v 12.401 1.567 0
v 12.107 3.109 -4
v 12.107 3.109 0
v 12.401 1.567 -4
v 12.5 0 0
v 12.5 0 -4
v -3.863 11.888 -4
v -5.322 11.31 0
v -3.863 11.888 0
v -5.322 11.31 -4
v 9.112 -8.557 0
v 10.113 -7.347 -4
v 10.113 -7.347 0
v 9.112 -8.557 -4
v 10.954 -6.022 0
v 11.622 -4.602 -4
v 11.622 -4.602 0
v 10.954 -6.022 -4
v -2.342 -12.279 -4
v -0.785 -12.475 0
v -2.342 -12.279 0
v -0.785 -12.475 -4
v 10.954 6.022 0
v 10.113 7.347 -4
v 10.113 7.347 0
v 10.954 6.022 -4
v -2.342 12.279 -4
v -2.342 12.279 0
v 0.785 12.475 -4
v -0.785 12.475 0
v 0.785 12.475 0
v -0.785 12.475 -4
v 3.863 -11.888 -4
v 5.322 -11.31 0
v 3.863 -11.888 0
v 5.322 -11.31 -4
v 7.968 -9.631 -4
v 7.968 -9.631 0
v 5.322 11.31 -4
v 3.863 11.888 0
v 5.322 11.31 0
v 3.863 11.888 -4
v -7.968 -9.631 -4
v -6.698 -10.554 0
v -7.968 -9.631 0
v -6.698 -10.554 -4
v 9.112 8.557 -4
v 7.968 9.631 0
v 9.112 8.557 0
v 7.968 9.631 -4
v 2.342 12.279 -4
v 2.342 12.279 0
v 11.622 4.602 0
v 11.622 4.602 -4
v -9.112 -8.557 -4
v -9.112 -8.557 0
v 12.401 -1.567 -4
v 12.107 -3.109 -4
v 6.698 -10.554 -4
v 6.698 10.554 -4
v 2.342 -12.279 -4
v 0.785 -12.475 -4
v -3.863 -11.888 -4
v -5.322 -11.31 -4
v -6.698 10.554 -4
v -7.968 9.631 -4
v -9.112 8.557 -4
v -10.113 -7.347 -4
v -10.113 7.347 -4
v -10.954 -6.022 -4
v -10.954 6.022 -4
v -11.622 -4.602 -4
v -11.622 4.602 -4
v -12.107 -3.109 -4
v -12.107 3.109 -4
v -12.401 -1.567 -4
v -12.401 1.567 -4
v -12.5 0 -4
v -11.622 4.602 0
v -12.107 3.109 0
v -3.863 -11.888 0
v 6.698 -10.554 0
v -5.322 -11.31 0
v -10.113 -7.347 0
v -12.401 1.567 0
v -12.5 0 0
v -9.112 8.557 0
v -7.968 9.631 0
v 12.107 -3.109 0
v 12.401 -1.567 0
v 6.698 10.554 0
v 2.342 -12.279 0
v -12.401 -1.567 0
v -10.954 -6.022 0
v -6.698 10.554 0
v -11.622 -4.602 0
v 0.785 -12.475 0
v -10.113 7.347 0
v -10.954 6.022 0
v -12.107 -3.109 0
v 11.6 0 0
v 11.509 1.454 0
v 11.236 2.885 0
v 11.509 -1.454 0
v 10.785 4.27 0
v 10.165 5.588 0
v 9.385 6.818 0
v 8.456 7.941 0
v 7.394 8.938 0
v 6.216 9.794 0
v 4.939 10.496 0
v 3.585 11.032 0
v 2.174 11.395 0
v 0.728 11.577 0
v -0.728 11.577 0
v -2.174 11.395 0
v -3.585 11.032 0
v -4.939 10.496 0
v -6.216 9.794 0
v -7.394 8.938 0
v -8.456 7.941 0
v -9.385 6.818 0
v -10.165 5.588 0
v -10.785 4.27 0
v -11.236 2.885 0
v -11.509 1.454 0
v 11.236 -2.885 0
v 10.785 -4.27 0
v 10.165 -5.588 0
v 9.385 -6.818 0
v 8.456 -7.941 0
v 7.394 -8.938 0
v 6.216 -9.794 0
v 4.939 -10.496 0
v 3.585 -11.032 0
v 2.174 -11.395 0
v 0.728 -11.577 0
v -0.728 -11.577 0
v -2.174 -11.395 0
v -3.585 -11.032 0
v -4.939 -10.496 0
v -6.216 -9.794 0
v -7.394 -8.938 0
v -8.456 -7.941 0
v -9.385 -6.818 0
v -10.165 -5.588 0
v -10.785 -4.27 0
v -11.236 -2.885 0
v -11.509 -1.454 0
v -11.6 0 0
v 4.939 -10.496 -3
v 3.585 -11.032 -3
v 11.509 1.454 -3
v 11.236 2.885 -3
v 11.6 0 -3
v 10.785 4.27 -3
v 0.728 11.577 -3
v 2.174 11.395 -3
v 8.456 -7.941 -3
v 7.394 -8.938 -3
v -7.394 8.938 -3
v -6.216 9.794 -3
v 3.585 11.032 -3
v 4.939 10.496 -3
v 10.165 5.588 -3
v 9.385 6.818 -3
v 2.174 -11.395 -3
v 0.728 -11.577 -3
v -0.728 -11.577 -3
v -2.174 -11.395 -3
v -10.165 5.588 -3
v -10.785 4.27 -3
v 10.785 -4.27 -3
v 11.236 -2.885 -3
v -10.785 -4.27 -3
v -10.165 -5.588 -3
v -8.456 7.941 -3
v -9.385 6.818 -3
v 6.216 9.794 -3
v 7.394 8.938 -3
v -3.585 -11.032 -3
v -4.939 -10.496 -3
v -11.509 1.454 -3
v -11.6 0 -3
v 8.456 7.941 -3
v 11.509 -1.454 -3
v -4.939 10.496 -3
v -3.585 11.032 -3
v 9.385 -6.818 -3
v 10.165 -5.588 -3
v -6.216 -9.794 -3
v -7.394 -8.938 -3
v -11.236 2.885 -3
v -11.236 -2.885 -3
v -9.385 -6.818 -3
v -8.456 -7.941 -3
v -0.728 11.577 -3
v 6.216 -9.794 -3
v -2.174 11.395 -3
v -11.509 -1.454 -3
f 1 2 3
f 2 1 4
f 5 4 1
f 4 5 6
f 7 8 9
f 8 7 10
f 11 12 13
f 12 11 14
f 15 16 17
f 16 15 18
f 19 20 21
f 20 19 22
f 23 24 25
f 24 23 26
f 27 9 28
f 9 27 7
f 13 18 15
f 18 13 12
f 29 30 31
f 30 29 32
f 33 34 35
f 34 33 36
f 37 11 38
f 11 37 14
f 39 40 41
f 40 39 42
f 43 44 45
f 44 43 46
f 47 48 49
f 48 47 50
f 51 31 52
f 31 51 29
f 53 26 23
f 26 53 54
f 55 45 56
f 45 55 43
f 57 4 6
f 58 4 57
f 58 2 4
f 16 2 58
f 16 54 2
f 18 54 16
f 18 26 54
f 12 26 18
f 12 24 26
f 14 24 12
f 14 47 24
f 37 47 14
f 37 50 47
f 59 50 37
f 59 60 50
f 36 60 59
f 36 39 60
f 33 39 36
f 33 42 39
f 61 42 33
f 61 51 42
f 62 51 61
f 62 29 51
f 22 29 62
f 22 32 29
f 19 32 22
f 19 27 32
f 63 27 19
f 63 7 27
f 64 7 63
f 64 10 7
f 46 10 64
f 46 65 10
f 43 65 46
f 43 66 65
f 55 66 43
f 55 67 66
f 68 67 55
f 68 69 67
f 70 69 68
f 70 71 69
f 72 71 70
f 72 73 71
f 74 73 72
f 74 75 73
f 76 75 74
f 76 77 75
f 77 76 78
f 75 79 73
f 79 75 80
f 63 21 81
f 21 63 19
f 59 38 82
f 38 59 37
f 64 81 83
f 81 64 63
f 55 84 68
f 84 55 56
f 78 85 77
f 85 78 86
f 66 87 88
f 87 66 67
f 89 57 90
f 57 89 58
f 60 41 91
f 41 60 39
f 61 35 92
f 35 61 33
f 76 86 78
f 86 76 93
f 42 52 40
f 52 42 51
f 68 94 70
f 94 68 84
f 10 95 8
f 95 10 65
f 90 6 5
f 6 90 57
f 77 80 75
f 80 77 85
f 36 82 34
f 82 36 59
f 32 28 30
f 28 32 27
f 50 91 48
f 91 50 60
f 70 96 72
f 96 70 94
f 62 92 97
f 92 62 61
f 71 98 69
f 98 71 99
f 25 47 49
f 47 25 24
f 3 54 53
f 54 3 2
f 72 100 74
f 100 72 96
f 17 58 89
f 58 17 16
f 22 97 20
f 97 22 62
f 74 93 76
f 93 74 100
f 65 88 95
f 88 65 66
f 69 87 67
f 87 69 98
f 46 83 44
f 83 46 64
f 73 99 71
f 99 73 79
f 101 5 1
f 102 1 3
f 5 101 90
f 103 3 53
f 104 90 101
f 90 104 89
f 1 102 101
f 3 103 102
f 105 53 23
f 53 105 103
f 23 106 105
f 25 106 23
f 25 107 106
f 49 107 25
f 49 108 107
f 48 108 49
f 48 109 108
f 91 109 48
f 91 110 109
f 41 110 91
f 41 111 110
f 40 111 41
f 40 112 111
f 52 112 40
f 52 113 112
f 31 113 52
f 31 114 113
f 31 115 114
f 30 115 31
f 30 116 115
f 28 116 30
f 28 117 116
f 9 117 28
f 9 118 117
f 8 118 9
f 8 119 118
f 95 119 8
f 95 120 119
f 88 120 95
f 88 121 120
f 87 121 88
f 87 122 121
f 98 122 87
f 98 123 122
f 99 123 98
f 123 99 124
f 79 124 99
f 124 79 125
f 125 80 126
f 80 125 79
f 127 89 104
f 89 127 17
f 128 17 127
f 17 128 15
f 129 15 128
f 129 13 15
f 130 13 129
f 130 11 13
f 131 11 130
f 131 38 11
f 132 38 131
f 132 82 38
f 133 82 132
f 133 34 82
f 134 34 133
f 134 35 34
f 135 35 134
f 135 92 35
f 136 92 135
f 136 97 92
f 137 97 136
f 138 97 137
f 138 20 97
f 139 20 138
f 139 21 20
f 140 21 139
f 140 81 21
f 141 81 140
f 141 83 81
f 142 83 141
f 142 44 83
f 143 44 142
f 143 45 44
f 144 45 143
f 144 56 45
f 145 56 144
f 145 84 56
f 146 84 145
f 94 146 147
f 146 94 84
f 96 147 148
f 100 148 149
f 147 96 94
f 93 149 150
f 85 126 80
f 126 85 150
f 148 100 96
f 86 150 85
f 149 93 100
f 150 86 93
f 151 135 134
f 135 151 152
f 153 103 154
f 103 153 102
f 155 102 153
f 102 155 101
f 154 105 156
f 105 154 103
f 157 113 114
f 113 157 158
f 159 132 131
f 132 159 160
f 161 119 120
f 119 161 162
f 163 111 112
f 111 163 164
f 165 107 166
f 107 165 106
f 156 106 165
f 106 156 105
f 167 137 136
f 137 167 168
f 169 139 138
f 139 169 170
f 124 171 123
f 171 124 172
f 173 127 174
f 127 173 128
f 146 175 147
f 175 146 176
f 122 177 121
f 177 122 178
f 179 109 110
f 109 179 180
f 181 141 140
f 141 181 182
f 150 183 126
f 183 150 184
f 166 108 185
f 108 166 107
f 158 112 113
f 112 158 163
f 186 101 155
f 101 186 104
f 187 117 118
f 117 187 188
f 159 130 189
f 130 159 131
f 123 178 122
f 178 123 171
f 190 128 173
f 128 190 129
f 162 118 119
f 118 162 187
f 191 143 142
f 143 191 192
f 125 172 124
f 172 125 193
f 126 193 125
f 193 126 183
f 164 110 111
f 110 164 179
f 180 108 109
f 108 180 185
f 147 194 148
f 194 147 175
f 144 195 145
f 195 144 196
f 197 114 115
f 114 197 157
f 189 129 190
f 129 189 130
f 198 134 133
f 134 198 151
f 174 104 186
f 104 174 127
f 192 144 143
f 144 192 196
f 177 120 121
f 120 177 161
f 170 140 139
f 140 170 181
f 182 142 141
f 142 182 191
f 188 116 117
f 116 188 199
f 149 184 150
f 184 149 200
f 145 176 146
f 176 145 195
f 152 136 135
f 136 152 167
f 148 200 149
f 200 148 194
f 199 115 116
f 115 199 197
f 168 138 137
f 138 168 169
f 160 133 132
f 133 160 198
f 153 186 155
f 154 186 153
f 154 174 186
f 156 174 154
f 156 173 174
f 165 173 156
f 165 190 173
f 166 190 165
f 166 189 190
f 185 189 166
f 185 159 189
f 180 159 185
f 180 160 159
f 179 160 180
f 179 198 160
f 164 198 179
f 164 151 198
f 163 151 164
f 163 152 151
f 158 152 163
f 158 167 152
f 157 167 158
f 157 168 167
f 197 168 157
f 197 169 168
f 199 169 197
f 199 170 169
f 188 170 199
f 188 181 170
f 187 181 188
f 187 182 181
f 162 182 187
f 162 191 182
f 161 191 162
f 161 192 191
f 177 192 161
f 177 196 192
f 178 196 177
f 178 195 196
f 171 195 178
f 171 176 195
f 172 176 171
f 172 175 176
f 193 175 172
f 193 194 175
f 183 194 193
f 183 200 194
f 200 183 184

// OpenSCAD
$fn = 50;


difference() {
	union() {
		translate(v = [0, 0, -4.0000000000]) {
			cylinder(h = 4, r = 12.5000000000);
		}
	}
	union() {
		#translate(v = [0, 0, -3.0000000000]) {
			cylinder(h = 3, r = 11.6000000000);
		}
	}
}
